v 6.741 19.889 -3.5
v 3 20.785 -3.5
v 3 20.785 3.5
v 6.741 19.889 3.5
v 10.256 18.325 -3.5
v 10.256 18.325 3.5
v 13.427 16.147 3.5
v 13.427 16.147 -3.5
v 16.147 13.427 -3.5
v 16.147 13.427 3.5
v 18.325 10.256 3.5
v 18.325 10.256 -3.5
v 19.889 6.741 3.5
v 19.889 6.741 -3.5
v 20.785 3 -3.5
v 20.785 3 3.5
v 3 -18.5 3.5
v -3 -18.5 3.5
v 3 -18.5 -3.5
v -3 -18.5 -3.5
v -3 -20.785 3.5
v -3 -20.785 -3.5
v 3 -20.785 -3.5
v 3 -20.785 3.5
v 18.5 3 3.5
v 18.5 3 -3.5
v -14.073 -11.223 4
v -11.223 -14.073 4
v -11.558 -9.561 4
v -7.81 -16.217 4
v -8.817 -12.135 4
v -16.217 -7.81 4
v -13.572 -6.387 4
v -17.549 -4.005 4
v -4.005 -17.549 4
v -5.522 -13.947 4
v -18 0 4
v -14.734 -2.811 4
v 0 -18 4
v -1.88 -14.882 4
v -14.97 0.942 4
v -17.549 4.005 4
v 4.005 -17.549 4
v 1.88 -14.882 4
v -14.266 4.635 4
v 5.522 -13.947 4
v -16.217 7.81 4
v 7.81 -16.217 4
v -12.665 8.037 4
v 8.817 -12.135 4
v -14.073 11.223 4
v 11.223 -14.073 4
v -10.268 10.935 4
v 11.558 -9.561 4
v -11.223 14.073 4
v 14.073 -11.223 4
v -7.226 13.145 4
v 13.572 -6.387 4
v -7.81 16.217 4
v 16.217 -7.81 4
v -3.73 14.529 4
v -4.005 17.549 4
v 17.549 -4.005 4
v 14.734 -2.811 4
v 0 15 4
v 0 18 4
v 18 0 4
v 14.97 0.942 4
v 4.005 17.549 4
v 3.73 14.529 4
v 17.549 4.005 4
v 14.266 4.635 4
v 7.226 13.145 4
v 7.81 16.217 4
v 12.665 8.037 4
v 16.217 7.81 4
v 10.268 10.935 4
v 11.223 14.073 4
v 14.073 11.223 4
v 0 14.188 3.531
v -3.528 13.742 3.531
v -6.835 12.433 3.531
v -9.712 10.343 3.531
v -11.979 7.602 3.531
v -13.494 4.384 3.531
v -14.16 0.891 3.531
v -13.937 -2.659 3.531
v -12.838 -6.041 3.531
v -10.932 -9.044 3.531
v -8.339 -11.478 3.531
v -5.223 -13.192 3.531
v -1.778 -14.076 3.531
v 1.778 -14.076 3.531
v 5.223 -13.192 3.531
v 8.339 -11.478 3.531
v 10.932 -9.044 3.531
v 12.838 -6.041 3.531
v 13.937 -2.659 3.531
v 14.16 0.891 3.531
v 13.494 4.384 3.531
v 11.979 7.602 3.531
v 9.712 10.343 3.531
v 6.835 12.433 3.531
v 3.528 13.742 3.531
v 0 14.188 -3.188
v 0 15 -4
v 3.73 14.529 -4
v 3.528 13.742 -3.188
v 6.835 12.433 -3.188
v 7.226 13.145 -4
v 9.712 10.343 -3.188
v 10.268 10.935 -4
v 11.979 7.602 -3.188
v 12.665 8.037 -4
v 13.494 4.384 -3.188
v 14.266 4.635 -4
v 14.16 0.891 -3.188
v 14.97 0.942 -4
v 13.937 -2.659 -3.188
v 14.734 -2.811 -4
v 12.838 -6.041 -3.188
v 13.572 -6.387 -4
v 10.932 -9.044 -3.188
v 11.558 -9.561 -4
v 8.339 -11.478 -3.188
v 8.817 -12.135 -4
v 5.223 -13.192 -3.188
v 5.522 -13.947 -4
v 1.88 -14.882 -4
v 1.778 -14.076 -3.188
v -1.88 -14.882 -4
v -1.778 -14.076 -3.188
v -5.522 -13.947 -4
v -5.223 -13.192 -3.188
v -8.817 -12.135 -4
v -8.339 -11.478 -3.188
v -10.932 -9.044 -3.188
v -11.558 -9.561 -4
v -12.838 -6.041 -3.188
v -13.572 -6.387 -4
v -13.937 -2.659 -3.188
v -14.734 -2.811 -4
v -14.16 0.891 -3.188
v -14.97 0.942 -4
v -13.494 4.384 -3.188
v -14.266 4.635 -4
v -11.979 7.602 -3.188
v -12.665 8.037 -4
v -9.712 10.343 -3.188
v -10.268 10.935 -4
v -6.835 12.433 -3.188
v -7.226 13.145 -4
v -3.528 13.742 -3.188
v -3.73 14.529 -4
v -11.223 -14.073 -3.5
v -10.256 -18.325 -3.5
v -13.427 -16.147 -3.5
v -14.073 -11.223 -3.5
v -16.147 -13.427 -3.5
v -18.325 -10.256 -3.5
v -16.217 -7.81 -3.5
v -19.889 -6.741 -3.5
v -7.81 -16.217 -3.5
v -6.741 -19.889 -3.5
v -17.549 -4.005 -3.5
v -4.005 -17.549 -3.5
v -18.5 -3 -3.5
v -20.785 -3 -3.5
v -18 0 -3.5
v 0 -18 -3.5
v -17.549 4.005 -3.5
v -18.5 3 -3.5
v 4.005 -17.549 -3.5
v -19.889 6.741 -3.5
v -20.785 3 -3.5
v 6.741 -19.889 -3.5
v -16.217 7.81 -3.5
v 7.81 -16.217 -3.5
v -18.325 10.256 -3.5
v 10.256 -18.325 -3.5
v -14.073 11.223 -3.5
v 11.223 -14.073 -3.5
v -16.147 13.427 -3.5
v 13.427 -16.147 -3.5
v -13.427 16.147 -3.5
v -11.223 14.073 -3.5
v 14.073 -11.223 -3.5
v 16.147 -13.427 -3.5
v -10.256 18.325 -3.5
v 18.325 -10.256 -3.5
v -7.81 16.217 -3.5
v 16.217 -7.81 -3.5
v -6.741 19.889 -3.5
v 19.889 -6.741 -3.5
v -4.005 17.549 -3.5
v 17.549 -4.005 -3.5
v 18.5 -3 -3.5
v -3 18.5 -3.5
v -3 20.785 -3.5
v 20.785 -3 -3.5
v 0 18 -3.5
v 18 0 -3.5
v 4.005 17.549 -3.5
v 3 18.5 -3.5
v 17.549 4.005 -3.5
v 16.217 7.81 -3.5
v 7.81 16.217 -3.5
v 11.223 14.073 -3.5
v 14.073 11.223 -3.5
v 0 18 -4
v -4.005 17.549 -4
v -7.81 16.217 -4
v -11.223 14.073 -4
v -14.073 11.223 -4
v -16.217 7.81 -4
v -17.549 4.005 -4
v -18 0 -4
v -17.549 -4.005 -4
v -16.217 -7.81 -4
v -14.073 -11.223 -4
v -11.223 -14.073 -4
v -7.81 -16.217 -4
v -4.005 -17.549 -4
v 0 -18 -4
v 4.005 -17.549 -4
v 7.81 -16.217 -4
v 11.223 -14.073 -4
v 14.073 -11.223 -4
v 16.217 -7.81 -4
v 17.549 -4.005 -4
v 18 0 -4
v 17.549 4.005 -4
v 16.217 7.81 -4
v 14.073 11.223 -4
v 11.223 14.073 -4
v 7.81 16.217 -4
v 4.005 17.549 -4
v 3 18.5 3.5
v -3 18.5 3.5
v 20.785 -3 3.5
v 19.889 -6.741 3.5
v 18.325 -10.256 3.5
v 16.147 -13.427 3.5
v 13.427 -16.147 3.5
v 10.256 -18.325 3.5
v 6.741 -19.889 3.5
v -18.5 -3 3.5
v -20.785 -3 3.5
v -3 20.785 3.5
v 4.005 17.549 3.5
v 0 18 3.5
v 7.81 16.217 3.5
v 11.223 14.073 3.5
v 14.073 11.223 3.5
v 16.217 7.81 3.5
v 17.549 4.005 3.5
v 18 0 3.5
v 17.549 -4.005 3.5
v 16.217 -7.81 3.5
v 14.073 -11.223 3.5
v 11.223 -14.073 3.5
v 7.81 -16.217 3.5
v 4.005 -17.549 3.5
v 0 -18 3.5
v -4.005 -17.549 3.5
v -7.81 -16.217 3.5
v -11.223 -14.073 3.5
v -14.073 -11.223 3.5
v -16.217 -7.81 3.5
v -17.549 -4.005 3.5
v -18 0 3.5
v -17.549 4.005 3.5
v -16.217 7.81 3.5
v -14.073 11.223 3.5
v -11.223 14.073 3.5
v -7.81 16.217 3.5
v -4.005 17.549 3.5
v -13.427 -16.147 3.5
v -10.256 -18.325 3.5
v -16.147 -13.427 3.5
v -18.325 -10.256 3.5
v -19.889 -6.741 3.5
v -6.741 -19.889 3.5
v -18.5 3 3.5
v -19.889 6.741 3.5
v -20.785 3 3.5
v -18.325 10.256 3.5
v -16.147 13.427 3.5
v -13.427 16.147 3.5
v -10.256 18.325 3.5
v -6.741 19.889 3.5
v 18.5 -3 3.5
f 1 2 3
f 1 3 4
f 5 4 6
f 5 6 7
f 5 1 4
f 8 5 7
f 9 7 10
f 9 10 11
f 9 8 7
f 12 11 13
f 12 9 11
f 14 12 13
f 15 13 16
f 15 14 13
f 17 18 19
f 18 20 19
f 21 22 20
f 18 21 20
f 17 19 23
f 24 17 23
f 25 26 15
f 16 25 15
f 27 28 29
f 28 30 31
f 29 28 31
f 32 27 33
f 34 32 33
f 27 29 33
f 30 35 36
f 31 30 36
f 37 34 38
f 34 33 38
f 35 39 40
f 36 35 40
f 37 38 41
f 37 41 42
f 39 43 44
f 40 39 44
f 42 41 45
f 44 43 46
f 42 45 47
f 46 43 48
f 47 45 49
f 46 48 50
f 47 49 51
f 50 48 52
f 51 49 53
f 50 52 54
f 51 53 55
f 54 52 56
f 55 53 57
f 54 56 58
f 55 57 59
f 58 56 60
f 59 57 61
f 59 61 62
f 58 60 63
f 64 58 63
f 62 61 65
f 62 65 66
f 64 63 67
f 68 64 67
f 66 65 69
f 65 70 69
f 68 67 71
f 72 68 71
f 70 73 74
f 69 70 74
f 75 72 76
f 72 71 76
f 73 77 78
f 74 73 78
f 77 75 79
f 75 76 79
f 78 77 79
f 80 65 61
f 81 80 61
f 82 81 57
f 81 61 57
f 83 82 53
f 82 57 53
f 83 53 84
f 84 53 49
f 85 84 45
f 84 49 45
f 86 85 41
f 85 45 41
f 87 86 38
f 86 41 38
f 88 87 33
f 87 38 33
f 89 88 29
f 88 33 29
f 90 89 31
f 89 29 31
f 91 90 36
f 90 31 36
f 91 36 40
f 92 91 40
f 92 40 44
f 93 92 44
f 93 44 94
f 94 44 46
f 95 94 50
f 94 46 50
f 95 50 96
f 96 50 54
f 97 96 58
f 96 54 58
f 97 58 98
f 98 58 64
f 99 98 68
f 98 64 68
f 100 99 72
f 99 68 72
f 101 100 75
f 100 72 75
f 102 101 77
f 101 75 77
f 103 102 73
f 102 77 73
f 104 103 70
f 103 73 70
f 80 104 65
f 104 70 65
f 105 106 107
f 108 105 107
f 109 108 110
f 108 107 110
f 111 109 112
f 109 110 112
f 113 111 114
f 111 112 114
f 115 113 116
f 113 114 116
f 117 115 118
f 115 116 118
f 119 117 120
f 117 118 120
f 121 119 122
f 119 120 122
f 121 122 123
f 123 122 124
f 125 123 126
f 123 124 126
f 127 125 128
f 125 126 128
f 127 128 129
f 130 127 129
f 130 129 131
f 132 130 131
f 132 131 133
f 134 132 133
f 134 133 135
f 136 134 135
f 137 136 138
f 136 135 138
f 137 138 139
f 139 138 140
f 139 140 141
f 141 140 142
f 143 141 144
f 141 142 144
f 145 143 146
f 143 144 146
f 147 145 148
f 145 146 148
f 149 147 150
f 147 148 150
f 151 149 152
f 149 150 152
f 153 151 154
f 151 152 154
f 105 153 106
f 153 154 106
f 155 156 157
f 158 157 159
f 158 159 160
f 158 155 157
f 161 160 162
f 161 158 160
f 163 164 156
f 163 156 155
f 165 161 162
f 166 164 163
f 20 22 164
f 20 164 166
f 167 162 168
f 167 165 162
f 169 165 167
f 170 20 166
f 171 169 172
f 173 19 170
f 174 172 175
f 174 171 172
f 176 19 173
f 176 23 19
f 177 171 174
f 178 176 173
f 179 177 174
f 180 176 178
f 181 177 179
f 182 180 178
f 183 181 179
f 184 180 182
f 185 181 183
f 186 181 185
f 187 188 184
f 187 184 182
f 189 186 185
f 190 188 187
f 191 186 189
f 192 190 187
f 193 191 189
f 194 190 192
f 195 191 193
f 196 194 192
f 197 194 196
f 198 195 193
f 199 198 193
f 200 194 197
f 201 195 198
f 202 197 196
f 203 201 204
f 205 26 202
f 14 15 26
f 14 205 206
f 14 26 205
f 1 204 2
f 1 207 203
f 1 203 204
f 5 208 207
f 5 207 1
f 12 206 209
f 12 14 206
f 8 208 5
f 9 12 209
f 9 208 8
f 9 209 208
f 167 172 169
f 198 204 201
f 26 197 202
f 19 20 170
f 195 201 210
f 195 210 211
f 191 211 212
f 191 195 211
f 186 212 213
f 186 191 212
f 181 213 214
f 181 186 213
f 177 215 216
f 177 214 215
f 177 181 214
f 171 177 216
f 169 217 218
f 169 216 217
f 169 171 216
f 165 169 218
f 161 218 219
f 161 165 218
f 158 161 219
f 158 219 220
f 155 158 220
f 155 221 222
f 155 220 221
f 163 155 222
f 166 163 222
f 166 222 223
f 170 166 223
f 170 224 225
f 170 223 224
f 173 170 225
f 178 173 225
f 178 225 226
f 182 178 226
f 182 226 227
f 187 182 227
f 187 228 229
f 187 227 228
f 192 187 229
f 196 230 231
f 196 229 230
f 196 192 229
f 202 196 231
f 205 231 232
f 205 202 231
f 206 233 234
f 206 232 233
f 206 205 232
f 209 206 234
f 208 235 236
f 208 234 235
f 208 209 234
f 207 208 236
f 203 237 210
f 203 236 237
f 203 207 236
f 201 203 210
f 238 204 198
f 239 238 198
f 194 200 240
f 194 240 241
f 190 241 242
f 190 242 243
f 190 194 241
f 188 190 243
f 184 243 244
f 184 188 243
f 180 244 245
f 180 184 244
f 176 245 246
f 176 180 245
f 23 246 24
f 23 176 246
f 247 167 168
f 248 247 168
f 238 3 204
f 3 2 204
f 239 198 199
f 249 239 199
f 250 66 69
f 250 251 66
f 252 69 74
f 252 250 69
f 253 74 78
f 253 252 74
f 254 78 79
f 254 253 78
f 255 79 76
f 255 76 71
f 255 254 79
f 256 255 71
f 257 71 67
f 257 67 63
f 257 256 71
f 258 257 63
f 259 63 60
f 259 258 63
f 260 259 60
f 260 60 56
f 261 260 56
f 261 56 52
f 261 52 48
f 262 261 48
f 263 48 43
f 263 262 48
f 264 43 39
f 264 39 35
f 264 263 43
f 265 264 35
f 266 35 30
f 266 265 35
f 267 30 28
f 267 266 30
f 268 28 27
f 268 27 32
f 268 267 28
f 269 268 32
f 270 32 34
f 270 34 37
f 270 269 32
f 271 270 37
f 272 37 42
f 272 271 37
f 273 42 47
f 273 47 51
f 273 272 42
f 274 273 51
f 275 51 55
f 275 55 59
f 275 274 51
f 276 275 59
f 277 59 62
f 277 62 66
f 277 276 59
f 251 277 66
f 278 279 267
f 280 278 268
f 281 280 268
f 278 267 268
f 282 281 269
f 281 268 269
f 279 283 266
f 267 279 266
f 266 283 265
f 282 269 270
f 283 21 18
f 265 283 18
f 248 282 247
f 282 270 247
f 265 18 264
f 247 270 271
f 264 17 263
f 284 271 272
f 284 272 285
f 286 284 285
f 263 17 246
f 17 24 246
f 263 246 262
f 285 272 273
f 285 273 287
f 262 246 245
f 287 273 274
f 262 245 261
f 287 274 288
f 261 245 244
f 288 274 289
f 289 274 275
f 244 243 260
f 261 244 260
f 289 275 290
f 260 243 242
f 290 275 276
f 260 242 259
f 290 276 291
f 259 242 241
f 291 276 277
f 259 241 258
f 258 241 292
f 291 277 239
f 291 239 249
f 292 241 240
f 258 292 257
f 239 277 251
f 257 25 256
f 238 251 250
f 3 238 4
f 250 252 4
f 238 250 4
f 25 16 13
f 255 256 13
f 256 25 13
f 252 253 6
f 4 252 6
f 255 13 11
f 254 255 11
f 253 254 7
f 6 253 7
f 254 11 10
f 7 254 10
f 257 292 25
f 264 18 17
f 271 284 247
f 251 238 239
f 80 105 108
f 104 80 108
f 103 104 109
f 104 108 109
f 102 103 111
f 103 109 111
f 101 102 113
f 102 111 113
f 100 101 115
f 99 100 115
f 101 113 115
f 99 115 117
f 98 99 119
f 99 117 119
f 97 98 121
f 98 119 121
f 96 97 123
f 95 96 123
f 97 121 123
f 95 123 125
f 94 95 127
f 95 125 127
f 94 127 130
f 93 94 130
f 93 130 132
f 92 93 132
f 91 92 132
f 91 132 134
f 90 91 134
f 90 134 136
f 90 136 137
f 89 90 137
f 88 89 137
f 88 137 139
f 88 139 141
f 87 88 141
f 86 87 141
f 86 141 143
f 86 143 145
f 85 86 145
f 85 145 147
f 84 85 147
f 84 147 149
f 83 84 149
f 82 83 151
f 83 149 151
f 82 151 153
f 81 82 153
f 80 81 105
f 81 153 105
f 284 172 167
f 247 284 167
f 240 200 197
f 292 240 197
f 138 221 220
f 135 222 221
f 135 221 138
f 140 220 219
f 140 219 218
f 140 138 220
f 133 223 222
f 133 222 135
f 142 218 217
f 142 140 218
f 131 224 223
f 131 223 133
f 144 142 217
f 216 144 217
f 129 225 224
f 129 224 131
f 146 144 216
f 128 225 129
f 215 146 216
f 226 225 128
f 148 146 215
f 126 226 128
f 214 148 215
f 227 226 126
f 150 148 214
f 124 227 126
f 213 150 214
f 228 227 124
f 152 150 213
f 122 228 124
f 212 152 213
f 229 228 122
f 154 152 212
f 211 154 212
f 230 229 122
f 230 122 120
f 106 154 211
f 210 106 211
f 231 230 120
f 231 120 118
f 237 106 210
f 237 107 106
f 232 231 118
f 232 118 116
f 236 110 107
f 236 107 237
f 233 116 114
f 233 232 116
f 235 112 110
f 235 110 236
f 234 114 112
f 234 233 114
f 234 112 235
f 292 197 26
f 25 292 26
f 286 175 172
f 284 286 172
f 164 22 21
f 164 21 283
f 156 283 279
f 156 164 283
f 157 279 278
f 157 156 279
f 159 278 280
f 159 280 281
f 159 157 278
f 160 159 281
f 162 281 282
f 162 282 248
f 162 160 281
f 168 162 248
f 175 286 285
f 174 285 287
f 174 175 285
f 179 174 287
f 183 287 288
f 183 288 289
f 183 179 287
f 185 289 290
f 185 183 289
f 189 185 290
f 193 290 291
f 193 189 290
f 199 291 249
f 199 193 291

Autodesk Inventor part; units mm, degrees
sketch "Sketch_1" plane through (0, 0, 0) normal (1, 0, 0) x (0, 1, 0)
  line L0 (0, -4) -> (0, 4)
  line L1 (0, 4) -> (18, 4)
  line L2 (18, 4) -> (18, 3.5)
  line L3 (18, 3.5) -> (21, 3.5)
  line L4 (21, 3.5) -> (21, -4)
  line L5 (21, -4) -> (0, -4)
  line L6 (0, -4) -> (0, 4)
revolve "Revolution1" add sketch "Sketch_1" angle 360 about axis through (0, 0, -4) along (0, 0, -1)
sketch "Sketch_2" plane through (0, 0, 0) normal (1, 0, 0) x (0, 1, 0)
  line L0 (0, -4) -> (0, 4)
  line L1 (0, 4) -> (15, 4)
  line L2 (15, 4) -> (14.188, 3.5312)
  line L3 (14.188, 3.5312) -> (14.188, -3.188)
  line L4 (14.188, -3.188) -> (15, -4)
  line L5 (15, -4) -> (0, -4)
  line L6 (0, -4) -> (0, 4)
revolve "Revolution2" cut sketch "Sketch_2" angle 360 about axis through (0, 0, -4) along (0, 0, -1)
thread "Thread1" size "M30x1.5" class "6H" standard "ISO Metric profile" full length
sketch "Sketch_6" plane through (0, 0, 0) normal (1, 0, 0) x (0, 1, 0)
  line L0 (0, -6) -> (0, -4)
  line L1 (0, -4) -> (18, -4)
  line L2 (18, -4) -> (18, -3.5)
  line L3 (18, -3.5) -> (21, -3.5)
  line L4 (21, -3.5) -> (21, -6)
  line L5 (21, -6) -> (0, -6)
  line L6 (0, -6) -> (0, -4)
revolve "Revolution3" cut sketch "Sketch_6" angle 360 about axis through (0, 0, -6) along (0, 0, -1)
sketch "Sketch_3" plane through (0, 0, 0) normal (0, 0, 1) x (1, 0, 0)
  circle A0 centre (0, 0) radius 25.2
  line L0 (-20.7846, 3) -> (-18.5, 3)
  line L1 (-18.5, 3) -> (-18.5, -3)
  line L2 (-18.5, -3) -> (-20.7846, -3)
  arc A1 (-20.7846, -3) -> (-3, -20.7846) centre (0, 0) ccw
  line L3 (-3, -20.7846) -> (-3, -18.5)
  line L4 (-3, -18.5) -> (3, -18.5)
  line L5 (3, -18.5) -> (3, -20.7846)
  arc A2 (3, -20.7846) -> (20.7846, -3) centre (0, 0) ccw
  line L6 (20.7846, -3) -> (18.5, -3)
  line L7 (18.5, -3) -> (18.5, 3)
  line L8 (18.5, 3) -> (20.7846, 3)
  arc A3 (20.7846, 3) -> (3, 20.7846) centre (0, 0) ccw
  line L9 (3, 20.7846) -> (3, 18.5)
  line L10 (3, 18.5) -> (-3, 18.5)
  line L11 (-3, 18.5) -> (-3, 20.7846)
  arc A4 (-3, 20.7846) -> (-20.7846, 3) centre (0, 0) ccw
extrude "Extrusion1" cut sketch "Sketch_3" along normal mid plane 8
ref_plane "FDT_CYLINDER_XY" through (0, 0, -4) normal (0, 0, 1) x (1, 0, 0)
ref_plane "FDT_CYLINDER_YZ" through (0, 0, -4) normal (1, 0, 0) x (0, 1, 0)
ref_plane "FDT_CYLINDER_ZX" through (0, 0, -4) normal (0, 1, 0) x (0, 0, 1)
ref_plane "NUT_XY" through (0, 0, 4) normal (0, 0, -1) x (1, 0, 0)
ref_plane "NUT_YZ" through (0, 0, 4) normal (1, 0, 0) x (0, -1, 0)
ref_plane "NUT_ZX" through (0, 0, 4) normal (0, -1, 0) x (0, 0, -1)
properties part number "3753 M30x1.5"
